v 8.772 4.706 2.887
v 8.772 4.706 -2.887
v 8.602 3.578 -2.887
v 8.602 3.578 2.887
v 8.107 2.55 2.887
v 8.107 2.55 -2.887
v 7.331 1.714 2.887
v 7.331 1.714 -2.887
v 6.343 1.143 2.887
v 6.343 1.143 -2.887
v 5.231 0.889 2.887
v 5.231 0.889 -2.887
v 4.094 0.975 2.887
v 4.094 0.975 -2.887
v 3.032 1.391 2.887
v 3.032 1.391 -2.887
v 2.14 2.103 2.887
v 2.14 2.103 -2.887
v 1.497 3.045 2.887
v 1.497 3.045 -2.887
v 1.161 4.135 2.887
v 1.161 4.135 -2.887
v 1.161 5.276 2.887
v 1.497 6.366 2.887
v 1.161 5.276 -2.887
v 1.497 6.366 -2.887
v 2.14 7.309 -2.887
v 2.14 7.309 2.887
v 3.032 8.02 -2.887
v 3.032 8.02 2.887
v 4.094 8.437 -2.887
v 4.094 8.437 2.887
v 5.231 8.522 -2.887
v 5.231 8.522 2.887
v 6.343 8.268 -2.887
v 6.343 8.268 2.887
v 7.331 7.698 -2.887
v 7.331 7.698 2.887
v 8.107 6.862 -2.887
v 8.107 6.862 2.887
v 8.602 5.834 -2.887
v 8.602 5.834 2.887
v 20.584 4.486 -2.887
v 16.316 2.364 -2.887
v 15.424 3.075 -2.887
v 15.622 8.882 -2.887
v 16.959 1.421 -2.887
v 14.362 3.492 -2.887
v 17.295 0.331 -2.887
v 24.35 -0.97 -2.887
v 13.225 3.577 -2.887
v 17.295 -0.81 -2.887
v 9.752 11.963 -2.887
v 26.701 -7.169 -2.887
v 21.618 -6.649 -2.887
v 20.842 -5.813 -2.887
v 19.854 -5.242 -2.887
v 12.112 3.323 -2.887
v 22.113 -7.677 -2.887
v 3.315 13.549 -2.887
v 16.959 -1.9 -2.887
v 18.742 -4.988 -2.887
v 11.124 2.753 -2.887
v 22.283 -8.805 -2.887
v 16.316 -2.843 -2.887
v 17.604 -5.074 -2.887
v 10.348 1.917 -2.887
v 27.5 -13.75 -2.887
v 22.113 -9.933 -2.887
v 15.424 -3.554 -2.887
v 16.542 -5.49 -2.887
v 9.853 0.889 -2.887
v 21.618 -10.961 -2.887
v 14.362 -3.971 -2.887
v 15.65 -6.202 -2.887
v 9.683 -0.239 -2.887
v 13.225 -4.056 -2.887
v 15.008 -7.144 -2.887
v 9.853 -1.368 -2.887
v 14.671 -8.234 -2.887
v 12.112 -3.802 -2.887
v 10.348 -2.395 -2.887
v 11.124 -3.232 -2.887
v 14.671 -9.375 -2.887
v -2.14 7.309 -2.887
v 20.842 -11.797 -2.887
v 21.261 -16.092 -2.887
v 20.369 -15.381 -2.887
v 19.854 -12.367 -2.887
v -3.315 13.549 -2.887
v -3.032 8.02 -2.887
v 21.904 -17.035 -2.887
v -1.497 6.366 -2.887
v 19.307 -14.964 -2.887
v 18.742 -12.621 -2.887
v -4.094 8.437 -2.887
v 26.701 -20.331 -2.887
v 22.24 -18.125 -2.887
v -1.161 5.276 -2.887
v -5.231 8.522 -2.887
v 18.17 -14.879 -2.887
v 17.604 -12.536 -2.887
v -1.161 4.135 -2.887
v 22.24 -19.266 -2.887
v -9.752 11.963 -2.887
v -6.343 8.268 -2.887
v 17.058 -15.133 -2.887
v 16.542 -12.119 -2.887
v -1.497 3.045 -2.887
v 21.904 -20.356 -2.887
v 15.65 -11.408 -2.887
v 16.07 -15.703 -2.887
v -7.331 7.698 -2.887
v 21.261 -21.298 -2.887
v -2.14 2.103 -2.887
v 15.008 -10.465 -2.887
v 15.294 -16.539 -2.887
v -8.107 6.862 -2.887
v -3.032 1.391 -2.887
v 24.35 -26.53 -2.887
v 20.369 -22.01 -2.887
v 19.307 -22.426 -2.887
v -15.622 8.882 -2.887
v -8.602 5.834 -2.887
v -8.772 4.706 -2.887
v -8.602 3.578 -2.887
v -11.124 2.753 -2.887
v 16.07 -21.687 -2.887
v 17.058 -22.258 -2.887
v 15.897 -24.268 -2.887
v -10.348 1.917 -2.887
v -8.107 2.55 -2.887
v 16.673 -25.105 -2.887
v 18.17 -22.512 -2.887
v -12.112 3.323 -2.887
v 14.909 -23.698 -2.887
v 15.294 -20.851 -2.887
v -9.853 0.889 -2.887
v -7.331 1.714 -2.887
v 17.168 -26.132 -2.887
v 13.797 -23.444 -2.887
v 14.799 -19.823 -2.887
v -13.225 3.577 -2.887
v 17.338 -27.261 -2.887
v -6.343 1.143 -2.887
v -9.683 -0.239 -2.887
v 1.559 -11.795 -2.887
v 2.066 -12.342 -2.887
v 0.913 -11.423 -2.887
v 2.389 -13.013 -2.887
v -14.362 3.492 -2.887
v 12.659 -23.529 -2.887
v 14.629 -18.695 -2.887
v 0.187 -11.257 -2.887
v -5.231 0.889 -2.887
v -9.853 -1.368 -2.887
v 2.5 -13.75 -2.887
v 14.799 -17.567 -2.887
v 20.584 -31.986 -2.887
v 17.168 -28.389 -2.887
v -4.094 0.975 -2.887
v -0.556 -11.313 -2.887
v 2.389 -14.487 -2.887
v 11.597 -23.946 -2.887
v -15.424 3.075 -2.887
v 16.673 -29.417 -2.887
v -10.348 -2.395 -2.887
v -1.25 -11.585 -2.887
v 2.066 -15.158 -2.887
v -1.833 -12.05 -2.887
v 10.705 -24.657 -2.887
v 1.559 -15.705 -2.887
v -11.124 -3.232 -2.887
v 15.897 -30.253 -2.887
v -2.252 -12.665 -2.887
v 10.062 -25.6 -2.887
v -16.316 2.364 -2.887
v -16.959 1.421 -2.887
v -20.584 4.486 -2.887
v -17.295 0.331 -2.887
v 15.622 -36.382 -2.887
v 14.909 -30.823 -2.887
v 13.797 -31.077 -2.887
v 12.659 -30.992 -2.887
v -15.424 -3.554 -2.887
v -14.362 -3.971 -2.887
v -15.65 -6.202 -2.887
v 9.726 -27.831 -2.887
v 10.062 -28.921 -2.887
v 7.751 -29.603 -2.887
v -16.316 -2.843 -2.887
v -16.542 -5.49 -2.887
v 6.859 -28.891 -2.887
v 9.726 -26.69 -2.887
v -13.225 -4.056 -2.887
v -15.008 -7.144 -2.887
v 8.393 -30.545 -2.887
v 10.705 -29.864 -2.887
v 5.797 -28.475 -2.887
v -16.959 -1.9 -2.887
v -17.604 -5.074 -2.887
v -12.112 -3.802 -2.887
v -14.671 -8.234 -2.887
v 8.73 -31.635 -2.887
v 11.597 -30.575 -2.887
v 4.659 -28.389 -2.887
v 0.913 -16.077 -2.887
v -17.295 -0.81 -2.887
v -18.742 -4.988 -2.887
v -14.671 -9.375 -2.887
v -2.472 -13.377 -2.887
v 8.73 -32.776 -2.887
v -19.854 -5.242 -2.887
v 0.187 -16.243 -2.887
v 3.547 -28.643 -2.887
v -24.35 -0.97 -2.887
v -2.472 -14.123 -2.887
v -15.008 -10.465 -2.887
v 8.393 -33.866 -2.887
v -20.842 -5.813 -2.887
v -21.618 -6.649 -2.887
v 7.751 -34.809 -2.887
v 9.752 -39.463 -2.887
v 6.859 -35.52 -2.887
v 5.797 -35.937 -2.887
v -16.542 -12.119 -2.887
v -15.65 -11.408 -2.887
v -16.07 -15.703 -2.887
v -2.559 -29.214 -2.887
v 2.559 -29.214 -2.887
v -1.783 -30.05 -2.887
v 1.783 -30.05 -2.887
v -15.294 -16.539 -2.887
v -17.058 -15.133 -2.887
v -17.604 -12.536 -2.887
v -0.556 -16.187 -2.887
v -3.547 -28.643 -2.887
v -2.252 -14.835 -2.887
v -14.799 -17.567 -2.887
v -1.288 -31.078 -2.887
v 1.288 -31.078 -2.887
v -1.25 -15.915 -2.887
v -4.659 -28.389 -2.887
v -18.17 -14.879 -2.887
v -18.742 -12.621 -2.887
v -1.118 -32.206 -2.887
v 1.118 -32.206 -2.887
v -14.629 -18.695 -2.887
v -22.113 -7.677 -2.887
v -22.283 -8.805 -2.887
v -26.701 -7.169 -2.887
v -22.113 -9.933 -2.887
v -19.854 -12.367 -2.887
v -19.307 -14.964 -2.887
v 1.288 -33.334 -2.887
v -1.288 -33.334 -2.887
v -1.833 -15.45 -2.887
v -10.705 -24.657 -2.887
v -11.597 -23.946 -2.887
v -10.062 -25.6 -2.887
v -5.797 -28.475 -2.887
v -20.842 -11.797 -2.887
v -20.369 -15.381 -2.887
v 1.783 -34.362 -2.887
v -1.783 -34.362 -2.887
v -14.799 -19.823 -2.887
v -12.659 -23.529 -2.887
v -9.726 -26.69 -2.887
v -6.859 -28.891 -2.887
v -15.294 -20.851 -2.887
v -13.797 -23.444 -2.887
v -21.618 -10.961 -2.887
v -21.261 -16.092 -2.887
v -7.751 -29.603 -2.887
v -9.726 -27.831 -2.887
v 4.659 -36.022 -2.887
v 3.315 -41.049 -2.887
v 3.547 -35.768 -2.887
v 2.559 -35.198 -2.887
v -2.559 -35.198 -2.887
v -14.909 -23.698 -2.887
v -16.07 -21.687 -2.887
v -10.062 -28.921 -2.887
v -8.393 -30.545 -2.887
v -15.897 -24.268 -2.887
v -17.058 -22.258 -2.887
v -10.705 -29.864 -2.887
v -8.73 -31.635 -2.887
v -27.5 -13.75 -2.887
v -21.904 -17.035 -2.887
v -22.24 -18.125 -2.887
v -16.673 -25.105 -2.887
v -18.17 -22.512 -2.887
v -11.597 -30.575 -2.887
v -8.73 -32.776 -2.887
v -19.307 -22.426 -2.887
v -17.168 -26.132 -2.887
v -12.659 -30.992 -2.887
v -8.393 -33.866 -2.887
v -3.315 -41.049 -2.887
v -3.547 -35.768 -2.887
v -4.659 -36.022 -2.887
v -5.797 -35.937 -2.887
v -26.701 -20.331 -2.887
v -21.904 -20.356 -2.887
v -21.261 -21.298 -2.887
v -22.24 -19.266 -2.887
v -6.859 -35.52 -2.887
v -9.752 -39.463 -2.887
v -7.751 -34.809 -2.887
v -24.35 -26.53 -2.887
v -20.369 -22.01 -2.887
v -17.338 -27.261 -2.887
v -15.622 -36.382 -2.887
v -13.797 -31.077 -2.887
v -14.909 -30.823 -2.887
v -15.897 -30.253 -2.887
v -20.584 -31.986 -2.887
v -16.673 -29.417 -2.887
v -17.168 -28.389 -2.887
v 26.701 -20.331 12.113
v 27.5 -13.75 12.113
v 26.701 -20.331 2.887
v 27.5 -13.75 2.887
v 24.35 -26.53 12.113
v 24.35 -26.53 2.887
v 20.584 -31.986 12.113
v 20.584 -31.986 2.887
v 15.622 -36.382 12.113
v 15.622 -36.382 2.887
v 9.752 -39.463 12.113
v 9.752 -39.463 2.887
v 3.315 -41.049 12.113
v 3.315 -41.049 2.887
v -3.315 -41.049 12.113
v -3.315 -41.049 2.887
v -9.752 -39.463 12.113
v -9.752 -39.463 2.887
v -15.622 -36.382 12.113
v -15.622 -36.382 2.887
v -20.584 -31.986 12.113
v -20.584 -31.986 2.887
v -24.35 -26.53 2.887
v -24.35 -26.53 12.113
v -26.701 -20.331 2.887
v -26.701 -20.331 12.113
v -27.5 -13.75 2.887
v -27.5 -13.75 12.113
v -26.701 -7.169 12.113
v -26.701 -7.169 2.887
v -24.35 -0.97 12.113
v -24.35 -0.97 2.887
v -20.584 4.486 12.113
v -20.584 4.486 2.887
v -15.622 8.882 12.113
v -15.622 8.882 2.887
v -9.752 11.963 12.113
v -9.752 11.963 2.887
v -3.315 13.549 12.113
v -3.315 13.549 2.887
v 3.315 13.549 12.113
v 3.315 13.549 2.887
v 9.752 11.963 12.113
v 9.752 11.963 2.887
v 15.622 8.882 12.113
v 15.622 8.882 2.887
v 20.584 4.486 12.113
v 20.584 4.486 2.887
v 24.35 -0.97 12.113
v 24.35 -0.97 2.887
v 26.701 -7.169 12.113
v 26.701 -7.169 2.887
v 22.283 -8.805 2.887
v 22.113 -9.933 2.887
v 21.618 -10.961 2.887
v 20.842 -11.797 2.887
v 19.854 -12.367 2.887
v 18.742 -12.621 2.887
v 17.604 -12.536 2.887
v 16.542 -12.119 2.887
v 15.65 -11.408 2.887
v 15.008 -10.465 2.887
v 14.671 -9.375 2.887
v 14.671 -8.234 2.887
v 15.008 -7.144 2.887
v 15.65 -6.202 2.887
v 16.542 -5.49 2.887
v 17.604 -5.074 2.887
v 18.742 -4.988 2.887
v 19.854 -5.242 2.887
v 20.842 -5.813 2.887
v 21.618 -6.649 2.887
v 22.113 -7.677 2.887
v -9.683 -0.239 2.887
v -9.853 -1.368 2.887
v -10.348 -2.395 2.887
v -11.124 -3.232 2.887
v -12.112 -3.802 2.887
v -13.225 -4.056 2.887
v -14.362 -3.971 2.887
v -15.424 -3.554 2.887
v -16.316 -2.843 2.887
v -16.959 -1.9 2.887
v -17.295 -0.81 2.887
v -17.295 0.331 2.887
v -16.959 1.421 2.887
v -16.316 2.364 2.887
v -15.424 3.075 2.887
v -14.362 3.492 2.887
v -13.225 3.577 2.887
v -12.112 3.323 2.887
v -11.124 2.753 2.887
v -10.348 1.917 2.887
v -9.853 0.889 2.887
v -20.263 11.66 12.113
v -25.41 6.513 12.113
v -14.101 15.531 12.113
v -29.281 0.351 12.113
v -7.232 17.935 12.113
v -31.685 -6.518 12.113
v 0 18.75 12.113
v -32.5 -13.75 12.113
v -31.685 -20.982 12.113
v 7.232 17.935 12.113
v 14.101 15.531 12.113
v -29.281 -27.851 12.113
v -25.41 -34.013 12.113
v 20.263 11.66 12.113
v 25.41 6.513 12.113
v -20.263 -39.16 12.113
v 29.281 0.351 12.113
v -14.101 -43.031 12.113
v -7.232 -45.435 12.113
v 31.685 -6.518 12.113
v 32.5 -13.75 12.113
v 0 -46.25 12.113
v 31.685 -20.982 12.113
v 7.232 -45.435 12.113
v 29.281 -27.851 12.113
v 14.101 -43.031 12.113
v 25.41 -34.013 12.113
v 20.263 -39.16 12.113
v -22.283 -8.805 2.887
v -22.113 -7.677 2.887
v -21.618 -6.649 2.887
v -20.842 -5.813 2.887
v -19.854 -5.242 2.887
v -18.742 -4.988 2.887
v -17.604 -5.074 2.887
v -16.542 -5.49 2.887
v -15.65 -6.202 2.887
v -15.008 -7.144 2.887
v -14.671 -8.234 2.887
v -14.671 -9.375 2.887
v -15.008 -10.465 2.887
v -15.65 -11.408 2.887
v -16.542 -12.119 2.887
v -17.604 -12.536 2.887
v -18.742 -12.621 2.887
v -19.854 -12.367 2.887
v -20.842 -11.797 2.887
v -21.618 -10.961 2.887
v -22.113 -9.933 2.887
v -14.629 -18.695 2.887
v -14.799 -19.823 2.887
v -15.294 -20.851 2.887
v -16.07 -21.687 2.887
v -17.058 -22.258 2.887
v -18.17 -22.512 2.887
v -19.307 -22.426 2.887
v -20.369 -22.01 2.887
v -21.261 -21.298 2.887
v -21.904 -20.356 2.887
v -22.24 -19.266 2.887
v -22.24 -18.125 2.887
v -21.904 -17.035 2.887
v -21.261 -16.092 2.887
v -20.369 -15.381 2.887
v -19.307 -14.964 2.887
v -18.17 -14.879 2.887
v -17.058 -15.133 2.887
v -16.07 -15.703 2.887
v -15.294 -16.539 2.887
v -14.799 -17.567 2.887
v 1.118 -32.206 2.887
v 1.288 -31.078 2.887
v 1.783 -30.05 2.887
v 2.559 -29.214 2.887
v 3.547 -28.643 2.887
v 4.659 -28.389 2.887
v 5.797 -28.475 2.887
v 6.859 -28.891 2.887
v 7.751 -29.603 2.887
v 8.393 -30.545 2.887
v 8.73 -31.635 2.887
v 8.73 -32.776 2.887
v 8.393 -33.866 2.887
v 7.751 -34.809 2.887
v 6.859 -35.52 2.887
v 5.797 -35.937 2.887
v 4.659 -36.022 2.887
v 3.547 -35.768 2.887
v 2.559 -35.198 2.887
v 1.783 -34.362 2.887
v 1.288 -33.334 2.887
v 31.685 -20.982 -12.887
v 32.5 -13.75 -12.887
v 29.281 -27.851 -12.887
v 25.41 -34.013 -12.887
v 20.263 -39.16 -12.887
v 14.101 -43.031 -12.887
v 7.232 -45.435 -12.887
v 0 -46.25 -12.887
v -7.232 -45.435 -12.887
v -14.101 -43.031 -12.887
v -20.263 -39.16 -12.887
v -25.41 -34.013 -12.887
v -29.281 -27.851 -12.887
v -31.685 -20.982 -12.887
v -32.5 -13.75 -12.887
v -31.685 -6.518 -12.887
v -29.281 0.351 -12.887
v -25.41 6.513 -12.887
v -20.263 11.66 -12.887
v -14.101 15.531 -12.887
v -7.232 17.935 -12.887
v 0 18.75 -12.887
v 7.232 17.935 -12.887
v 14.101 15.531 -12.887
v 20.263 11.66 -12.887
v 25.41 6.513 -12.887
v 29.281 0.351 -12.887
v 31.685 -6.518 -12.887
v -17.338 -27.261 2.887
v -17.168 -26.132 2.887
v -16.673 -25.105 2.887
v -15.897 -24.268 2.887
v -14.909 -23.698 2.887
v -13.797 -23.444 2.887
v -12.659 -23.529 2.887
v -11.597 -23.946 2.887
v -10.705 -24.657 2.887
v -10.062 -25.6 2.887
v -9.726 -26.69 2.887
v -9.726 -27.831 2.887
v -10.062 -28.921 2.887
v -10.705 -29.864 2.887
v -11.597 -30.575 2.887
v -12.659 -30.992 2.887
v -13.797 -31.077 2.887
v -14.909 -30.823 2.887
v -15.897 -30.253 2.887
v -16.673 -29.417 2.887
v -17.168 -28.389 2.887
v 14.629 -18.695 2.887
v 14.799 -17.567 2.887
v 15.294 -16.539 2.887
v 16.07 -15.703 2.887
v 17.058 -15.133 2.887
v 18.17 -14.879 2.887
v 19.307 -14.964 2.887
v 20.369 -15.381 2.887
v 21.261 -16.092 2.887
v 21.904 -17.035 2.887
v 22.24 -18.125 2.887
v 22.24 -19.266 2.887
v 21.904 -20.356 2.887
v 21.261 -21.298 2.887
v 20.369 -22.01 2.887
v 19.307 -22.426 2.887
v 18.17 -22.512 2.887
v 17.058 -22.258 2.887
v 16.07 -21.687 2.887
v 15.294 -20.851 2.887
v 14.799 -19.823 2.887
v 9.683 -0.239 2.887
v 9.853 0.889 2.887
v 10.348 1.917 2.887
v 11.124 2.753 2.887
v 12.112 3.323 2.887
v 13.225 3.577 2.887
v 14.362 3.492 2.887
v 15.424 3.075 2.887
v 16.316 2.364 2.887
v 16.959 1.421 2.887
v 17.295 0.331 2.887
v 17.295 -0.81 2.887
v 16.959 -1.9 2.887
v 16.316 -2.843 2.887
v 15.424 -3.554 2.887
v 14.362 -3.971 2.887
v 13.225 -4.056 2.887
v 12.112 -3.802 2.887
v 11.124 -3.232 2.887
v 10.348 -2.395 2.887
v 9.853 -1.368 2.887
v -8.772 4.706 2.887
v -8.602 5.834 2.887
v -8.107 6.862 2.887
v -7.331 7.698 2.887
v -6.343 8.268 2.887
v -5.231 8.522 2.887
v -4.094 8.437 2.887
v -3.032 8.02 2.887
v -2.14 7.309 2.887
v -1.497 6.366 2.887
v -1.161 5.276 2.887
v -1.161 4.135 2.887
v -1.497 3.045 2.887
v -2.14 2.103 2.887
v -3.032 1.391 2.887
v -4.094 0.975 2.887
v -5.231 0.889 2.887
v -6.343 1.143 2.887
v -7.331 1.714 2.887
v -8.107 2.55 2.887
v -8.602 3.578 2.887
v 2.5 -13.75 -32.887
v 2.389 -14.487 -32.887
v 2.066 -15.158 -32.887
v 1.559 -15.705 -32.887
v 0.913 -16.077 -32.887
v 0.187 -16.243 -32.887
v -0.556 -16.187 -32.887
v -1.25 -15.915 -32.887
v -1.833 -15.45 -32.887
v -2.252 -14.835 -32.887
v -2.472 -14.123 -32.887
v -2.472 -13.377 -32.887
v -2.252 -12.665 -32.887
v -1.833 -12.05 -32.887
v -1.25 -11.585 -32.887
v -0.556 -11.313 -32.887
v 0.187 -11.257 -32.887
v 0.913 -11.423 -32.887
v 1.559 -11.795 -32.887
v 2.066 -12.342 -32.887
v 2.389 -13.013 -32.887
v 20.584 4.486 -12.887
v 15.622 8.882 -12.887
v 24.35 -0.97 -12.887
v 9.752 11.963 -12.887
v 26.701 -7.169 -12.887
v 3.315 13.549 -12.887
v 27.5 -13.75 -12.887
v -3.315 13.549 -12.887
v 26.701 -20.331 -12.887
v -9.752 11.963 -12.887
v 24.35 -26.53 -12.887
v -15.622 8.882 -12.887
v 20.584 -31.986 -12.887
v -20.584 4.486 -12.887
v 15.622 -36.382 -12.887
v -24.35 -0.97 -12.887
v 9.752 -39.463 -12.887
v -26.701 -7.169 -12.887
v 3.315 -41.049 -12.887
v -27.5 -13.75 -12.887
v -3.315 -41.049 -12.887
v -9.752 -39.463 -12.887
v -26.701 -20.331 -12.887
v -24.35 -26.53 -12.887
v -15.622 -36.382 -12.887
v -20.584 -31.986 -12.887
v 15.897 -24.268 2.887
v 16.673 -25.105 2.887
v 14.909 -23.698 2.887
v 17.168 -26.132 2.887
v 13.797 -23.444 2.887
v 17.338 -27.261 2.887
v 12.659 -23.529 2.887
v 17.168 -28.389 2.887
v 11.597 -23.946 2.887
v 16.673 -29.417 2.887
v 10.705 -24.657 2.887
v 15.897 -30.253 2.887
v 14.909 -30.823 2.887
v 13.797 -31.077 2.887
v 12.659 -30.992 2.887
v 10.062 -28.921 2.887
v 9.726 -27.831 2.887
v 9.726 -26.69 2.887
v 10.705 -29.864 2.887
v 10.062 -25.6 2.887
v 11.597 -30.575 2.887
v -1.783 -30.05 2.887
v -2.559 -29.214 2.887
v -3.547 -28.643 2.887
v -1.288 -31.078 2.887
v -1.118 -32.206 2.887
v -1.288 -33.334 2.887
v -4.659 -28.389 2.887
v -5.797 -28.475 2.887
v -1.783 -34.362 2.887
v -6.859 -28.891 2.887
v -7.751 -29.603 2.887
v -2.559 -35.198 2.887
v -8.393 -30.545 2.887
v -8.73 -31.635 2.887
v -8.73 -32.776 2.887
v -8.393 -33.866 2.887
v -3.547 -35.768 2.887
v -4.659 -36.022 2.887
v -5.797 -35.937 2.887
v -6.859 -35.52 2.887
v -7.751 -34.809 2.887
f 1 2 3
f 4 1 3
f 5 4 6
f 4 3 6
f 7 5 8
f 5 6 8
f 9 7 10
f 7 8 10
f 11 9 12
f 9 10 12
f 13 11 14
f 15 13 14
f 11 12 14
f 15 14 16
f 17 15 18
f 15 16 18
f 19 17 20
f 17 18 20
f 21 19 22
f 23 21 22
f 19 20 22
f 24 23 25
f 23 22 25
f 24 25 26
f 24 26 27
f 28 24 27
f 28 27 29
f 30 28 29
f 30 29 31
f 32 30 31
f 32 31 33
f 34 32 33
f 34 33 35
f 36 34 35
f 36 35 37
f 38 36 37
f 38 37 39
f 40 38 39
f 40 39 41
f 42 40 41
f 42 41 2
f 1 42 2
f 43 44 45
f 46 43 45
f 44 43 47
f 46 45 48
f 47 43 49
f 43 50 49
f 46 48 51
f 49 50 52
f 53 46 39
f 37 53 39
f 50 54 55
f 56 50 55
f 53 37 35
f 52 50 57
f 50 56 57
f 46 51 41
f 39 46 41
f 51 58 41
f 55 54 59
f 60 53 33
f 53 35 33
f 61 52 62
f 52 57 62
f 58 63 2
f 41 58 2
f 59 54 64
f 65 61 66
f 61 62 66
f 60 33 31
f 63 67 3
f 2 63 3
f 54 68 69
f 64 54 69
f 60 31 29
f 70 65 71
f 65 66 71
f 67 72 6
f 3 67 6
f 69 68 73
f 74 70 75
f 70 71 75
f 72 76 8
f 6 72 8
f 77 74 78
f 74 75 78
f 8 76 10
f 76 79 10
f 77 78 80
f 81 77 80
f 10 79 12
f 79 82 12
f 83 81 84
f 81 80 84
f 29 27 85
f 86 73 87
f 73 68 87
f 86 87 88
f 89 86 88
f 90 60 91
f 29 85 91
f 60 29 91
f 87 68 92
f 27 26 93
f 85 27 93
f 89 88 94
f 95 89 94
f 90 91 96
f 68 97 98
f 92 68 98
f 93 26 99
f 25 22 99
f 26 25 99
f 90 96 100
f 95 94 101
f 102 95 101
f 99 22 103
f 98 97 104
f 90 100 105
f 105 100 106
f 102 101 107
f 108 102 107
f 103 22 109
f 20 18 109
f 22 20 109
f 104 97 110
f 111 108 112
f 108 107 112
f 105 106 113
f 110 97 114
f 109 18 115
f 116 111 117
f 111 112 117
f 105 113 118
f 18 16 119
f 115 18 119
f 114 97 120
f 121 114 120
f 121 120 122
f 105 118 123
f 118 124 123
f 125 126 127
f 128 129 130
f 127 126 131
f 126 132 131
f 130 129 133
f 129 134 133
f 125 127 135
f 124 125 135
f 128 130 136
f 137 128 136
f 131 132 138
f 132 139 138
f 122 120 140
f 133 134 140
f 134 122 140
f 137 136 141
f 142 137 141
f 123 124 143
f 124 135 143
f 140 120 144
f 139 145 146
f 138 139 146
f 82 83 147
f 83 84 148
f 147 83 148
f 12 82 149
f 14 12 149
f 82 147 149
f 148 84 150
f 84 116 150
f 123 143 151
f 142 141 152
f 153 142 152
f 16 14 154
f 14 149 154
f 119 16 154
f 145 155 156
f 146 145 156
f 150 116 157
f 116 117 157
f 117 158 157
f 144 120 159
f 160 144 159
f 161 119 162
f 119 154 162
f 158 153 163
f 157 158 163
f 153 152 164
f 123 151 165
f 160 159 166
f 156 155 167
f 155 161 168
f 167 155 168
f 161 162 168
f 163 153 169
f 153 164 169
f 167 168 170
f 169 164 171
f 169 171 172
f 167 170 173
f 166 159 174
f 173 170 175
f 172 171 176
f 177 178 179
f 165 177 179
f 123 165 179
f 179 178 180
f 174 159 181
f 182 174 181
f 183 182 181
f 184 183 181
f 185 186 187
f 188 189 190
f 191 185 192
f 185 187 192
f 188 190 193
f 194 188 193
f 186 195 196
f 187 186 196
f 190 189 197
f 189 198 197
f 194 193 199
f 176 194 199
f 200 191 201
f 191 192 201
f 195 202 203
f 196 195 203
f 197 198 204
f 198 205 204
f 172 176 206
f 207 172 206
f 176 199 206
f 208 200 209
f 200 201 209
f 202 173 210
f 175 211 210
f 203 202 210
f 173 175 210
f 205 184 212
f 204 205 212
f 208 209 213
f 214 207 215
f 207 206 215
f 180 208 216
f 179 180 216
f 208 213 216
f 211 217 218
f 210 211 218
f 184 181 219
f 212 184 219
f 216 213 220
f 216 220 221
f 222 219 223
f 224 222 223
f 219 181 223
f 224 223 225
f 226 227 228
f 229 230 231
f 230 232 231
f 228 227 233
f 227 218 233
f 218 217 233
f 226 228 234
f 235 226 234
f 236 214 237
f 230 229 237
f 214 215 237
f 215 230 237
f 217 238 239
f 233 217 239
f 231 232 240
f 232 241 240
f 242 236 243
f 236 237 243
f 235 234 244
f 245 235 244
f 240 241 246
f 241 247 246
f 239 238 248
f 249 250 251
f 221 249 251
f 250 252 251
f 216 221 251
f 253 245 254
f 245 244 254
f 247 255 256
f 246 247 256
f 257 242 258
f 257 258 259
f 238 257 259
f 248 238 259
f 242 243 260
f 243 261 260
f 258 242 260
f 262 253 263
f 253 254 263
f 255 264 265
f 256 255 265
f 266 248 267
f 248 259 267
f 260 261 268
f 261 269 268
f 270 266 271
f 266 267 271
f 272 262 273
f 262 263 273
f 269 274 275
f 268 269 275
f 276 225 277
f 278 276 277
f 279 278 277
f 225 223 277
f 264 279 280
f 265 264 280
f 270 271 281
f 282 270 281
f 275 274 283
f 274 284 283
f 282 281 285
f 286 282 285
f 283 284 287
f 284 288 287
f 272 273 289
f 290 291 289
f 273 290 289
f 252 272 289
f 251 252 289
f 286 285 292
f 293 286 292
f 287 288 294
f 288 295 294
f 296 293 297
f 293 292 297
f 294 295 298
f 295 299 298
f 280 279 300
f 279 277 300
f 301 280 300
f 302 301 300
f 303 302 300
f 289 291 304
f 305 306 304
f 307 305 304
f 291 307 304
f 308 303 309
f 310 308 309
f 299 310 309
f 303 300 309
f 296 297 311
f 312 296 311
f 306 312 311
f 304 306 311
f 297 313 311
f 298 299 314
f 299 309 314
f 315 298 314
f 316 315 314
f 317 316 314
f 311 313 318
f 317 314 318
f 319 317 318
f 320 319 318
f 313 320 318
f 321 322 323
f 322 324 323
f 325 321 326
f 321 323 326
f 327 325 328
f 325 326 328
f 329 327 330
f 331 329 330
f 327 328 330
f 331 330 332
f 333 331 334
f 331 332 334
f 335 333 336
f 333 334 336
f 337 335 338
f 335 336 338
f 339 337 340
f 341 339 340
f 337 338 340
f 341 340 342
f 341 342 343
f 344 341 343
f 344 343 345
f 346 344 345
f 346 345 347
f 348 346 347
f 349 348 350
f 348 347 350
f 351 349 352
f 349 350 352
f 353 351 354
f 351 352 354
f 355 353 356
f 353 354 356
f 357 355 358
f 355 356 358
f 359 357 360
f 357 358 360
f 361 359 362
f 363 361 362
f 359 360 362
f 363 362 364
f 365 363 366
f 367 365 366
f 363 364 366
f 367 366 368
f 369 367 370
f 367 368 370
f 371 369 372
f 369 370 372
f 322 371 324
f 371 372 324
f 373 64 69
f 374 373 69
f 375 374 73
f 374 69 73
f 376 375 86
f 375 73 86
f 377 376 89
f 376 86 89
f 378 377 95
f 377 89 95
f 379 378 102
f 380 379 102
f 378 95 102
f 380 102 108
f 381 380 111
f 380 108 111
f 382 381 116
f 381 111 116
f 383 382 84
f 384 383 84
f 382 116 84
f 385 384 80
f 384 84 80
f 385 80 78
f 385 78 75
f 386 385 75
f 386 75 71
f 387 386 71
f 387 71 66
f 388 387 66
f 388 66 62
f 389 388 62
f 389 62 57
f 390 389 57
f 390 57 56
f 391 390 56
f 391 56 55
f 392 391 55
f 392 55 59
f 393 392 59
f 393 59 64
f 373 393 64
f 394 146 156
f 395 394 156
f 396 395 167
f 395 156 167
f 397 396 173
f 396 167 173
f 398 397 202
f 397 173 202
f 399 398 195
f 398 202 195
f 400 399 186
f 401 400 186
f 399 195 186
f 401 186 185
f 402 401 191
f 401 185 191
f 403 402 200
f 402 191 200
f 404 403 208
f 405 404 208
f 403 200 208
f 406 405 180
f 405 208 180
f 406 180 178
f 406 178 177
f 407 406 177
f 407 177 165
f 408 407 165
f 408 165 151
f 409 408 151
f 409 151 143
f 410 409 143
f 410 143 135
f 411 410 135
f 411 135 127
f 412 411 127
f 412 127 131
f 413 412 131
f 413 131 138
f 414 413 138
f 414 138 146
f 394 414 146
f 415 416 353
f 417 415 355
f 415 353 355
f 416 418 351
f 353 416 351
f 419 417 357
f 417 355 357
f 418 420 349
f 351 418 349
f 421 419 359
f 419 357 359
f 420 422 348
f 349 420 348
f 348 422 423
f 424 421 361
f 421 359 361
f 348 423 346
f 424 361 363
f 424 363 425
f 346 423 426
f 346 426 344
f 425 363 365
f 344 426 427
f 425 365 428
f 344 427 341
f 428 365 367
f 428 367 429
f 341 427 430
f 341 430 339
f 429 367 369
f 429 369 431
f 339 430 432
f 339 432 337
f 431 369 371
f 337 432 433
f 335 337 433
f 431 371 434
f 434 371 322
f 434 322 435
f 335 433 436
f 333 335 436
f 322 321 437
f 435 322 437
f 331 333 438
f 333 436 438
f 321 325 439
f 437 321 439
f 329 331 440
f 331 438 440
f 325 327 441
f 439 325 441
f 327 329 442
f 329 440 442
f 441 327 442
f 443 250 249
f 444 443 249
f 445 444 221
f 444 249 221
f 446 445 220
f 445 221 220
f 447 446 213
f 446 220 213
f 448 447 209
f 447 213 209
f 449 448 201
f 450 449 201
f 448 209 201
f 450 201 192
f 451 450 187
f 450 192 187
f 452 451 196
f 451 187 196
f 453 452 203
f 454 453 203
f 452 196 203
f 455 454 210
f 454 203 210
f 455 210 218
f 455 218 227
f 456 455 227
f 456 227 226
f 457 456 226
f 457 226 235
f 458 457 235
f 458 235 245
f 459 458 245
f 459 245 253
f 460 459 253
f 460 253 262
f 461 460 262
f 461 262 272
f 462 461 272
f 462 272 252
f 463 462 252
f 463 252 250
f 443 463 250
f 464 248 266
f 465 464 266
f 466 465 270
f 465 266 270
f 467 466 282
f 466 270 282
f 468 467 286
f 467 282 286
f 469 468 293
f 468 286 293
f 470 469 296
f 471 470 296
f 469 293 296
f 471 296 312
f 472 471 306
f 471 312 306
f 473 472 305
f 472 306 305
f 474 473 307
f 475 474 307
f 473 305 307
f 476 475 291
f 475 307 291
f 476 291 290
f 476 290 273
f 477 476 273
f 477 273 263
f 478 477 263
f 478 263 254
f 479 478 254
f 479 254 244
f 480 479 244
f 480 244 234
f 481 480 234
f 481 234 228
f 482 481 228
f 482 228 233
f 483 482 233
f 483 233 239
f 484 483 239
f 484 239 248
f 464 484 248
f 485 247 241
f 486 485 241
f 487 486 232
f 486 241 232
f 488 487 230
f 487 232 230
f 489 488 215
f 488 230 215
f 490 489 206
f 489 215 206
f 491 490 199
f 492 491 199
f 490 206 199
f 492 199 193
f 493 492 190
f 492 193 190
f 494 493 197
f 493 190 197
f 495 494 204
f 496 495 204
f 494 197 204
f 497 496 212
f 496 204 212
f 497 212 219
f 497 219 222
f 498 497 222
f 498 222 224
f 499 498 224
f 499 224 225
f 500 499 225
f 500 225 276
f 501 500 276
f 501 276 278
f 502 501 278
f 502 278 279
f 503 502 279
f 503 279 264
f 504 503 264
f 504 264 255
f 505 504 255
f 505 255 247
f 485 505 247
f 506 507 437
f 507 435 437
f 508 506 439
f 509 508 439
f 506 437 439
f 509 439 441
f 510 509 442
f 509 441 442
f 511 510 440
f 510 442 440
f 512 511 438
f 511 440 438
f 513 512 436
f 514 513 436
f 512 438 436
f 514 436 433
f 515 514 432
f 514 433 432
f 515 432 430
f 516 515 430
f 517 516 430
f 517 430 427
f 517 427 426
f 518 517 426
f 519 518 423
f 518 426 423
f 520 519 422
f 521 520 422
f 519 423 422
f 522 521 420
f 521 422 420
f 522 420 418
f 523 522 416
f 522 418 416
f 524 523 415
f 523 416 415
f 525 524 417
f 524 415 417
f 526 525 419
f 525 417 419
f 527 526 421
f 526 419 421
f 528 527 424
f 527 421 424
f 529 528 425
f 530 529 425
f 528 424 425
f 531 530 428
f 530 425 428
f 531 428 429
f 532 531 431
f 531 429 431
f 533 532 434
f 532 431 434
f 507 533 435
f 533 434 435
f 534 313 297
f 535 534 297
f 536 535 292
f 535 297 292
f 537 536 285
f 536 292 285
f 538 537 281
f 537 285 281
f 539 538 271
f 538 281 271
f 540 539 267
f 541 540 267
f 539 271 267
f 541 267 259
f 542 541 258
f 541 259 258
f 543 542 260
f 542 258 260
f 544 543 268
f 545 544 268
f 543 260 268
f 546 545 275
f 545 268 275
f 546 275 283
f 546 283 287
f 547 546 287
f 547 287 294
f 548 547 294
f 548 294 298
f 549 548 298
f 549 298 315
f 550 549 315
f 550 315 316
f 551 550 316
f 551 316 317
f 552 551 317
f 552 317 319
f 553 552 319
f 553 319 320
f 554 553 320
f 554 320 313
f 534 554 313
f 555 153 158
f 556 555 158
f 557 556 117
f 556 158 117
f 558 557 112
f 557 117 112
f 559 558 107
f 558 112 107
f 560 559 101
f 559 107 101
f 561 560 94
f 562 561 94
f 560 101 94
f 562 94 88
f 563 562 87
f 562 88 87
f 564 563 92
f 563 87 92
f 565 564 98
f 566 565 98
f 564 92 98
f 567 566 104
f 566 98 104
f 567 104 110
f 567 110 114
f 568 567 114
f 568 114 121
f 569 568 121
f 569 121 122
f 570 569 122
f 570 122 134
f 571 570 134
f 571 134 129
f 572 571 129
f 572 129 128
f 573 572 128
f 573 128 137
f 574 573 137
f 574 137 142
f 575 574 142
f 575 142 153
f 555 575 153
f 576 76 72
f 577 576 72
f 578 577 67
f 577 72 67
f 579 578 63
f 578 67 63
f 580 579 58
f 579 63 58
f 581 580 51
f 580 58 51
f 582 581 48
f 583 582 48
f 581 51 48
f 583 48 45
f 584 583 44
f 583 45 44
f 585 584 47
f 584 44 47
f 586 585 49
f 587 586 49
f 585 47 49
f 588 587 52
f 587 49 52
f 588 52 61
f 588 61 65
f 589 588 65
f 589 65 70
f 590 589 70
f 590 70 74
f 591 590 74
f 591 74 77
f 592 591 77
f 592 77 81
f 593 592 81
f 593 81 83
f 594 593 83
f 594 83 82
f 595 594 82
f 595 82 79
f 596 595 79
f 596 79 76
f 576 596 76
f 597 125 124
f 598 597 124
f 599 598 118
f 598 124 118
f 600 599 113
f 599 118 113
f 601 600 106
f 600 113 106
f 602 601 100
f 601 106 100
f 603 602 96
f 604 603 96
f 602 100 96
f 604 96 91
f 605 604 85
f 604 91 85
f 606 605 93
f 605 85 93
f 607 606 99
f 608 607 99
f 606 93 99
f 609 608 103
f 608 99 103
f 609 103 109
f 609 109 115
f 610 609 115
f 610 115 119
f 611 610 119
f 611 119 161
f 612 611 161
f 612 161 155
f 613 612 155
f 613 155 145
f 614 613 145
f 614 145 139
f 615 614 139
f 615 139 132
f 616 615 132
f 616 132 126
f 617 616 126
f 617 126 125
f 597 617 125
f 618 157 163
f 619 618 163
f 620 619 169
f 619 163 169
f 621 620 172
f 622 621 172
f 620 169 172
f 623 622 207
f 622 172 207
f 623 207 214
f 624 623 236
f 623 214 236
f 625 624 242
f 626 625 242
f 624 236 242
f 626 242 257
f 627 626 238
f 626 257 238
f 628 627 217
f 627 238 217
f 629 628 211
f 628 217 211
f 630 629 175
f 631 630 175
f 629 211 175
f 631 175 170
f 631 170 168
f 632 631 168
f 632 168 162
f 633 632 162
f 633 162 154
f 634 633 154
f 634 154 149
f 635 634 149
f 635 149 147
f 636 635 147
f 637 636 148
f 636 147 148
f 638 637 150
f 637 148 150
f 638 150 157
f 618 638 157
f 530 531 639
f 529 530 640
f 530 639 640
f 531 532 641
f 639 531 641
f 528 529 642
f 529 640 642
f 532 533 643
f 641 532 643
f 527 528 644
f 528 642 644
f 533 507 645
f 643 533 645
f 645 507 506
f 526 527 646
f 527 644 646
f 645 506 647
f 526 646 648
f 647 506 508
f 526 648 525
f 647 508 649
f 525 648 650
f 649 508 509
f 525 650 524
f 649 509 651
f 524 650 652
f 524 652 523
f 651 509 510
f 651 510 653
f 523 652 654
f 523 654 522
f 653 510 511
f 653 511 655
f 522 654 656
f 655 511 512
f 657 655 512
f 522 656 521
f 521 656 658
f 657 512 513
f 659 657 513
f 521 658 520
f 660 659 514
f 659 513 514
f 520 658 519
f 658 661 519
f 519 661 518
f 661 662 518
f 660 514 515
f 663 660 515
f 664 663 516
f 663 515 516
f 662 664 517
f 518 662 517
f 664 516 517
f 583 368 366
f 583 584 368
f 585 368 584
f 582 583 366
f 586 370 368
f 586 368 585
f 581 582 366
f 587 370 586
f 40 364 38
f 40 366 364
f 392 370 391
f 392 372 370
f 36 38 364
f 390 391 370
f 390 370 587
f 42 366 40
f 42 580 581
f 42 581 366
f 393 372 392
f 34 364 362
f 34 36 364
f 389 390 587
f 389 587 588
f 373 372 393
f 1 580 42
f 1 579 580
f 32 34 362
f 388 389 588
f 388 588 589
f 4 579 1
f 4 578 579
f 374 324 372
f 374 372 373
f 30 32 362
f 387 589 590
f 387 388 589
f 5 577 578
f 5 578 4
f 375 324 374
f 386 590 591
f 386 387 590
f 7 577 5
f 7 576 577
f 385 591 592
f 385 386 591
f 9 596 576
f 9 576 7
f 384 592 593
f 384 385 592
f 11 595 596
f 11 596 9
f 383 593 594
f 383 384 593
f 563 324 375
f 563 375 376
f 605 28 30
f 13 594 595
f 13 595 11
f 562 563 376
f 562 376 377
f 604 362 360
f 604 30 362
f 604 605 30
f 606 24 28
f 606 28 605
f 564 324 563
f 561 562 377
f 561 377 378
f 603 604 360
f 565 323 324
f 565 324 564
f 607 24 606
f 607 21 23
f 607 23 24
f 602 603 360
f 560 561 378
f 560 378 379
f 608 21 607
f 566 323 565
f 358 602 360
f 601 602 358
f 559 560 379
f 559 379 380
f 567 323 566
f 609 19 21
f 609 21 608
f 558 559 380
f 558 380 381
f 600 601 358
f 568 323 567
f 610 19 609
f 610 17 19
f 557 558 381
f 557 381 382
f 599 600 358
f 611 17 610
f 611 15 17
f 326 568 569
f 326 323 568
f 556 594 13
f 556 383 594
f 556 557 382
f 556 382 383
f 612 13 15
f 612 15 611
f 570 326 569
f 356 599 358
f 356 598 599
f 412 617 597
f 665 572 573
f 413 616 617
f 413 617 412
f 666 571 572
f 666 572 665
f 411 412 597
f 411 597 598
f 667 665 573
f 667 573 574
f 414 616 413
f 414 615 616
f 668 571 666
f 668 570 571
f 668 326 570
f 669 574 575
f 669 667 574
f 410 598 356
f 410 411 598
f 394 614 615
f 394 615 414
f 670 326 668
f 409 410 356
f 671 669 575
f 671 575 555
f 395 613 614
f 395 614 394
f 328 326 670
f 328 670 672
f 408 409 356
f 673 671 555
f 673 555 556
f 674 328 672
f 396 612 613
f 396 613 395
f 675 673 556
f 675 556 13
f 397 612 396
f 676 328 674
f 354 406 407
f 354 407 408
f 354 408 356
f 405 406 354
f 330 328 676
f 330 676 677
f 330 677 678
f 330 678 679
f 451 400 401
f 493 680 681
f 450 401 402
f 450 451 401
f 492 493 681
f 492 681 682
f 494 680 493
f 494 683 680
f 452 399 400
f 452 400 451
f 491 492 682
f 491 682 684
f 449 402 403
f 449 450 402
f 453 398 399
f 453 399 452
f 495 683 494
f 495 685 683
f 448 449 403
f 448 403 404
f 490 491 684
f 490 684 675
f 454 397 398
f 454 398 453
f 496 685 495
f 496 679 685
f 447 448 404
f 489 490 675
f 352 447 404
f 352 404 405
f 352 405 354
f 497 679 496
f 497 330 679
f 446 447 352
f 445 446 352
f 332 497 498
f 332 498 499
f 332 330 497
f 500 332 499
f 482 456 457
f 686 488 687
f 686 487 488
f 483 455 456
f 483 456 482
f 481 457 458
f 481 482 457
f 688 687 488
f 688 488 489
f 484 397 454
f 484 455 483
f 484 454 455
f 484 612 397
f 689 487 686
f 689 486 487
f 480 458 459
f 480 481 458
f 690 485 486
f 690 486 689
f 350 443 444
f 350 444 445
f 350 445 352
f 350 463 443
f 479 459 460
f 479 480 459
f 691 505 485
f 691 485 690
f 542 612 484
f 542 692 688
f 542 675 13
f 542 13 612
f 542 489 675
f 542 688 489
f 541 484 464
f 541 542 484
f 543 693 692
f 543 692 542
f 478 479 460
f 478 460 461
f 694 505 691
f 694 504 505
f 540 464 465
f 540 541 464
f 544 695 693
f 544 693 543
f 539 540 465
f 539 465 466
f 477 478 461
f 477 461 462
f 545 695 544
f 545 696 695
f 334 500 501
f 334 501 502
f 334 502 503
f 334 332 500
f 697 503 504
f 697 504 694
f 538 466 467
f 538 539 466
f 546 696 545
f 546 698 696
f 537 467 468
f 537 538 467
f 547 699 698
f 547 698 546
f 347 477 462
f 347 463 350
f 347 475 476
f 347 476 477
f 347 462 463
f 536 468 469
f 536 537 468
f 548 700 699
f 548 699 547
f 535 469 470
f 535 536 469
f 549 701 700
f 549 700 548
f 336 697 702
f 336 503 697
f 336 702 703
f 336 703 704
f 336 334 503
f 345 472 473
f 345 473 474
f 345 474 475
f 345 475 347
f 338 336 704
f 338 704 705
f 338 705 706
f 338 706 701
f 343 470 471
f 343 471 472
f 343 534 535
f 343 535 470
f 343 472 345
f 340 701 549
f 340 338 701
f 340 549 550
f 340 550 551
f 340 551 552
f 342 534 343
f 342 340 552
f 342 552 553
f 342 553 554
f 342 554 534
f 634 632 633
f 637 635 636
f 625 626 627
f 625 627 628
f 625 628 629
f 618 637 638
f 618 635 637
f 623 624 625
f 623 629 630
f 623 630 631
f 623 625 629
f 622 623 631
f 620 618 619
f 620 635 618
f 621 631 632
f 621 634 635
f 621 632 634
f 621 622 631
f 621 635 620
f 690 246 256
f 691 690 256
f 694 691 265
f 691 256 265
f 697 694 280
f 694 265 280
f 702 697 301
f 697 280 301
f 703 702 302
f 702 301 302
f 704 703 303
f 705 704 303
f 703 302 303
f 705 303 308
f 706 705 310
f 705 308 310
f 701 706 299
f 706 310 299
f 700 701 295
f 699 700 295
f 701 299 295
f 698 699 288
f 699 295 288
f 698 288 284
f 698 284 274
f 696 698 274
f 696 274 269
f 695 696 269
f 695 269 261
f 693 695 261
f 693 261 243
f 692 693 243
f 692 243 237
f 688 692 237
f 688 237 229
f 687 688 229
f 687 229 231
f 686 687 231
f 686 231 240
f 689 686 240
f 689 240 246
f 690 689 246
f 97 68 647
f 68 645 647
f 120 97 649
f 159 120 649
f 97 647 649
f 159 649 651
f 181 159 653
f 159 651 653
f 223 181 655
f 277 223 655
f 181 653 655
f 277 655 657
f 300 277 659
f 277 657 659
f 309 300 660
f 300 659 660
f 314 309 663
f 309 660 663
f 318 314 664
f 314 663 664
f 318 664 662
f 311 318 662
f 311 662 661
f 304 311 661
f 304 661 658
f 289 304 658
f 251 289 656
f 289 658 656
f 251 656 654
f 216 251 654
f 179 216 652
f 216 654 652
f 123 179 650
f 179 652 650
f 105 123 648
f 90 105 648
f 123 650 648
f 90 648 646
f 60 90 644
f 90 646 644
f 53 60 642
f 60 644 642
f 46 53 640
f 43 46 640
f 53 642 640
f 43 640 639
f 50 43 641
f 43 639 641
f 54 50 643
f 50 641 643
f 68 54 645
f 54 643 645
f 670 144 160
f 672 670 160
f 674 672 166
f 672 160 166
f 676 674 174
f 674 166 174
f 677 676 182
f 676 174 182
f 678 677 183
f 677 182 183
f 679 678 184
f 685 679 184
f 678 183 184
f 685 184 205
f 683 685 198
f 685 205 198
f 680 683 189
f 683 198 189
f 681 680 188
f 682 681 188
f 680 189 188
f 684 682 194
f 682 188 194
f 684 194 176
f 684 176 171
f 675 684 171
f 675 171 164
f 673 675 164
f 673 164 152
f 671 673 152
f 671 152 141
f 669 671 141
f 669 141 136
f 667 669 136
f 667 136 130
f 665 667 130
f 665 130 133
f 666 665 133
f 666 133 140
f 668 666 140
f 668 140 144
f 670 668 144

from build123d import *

# Parameters (mm, degrees)
SKETCH4_W           = 5.773195876
SKETCH4_H           = 27.5
SKETCH5_R           = 3.827192532
CUT_EXTRUDE1_DEPTH  = 10
SKETCH7_R           = 2.5
BOSS_EXTRUDE1_DEPTH = 30


with BuildPart() as part:
    # Sketch4 → Revolve3 (revolve)
    with BuildSketch(Plane(origin=(0, 0, 0), x_dir=(0, 0, -1), z_dir=(1, 0, 0)), mode=Mode.PRIVATE) as revolve3_sk:
        Polygon((-2.886597938, 13.75), (2.886597938, 13.75), (12.886597938, 13.75), (12.886597938, 18.75), (-12.113402062, 18.75), (-12.113402062, 13.75), align=None)
        Rectangle(SKETCH4_W, SKETCH4_H)
    revolve(revolve3_sk.sketch.rotate(Axis((0, -13.75, 14.432989691), (0, 0, -1)), 90), axis=Axis((0, -13.75, 14.432989691), (0, 0, -1)))

    # Sketch5 → Cut-Extrude1 (cut)
    with BuildSketch(Plane(origin=(0, 0, -2.886597938), x_dir=(-1, 0, 0), z_dir=(0, 0, -1))):
        with Locations((4.945213264, 4.705787154)):
            Circle(SKETCH5_R)
        with Locations(Location((13.51057389, -0.23942611, 0), (0, 0, 180))):
            Circle(SKETCH5_R)
        with Locations((18.455787154, -8.804786736)):
            Circle(SKETCH5_R)
        with Locations(Location((18.455787154, -18.695213264, 0), (0, 0, 180))):
            Circle(SKETCH5_R)
        with Locations((13.51057389, -27.26057389)):
            Circle(SKETCH5_R)
        with Locations(Location((4.945213264, -32.205787154, 0), (0, 0, 180))):
            Circle(SKETCH5_R)
        with Locations((-4.945213264, -32.205787154)):
            Circle(SKETCH5_R)
        with Locations(Location((-13.51057389, -27.26057389, 0), (0, 0, 180))):
            Circle(SKETCH5_R)
        with Locations((-18.455787154, -18.695213264)):
            Circle(SKETCH5_R)
        with Locations(Location((-18.455787154, -8.804786736, 0), (0, 0, 180))):
            Circle(SKETCH5_R)
        with Locations((-13.51057389, -0.23942611)):
            Circle(SKETCH5_R)
        with Locations(Location((-4.945213264, 4.705787154, 0), (0, 0, 180))):
            Circle(SKETCH5_R)
    extrude(amount=-CUT_EXTRUDE1_DEPTH, mode=Mode.SUBTRACT)

    # Sketch7 → Boss-Extrude1 (add)
    with BuildSketch(Plane(origin=(0, 0, -2.886597938), x_dir=(-1, 0, 0), z_dir=(0, 0, -1))):
        with Locations(Location((0, -13.75, 0), (0, 0, 180))):
            Circle(SKETCH7_R)
    extrude(amount=BOSS_EXTRUDE1_DEPTH)


solid = part.part
